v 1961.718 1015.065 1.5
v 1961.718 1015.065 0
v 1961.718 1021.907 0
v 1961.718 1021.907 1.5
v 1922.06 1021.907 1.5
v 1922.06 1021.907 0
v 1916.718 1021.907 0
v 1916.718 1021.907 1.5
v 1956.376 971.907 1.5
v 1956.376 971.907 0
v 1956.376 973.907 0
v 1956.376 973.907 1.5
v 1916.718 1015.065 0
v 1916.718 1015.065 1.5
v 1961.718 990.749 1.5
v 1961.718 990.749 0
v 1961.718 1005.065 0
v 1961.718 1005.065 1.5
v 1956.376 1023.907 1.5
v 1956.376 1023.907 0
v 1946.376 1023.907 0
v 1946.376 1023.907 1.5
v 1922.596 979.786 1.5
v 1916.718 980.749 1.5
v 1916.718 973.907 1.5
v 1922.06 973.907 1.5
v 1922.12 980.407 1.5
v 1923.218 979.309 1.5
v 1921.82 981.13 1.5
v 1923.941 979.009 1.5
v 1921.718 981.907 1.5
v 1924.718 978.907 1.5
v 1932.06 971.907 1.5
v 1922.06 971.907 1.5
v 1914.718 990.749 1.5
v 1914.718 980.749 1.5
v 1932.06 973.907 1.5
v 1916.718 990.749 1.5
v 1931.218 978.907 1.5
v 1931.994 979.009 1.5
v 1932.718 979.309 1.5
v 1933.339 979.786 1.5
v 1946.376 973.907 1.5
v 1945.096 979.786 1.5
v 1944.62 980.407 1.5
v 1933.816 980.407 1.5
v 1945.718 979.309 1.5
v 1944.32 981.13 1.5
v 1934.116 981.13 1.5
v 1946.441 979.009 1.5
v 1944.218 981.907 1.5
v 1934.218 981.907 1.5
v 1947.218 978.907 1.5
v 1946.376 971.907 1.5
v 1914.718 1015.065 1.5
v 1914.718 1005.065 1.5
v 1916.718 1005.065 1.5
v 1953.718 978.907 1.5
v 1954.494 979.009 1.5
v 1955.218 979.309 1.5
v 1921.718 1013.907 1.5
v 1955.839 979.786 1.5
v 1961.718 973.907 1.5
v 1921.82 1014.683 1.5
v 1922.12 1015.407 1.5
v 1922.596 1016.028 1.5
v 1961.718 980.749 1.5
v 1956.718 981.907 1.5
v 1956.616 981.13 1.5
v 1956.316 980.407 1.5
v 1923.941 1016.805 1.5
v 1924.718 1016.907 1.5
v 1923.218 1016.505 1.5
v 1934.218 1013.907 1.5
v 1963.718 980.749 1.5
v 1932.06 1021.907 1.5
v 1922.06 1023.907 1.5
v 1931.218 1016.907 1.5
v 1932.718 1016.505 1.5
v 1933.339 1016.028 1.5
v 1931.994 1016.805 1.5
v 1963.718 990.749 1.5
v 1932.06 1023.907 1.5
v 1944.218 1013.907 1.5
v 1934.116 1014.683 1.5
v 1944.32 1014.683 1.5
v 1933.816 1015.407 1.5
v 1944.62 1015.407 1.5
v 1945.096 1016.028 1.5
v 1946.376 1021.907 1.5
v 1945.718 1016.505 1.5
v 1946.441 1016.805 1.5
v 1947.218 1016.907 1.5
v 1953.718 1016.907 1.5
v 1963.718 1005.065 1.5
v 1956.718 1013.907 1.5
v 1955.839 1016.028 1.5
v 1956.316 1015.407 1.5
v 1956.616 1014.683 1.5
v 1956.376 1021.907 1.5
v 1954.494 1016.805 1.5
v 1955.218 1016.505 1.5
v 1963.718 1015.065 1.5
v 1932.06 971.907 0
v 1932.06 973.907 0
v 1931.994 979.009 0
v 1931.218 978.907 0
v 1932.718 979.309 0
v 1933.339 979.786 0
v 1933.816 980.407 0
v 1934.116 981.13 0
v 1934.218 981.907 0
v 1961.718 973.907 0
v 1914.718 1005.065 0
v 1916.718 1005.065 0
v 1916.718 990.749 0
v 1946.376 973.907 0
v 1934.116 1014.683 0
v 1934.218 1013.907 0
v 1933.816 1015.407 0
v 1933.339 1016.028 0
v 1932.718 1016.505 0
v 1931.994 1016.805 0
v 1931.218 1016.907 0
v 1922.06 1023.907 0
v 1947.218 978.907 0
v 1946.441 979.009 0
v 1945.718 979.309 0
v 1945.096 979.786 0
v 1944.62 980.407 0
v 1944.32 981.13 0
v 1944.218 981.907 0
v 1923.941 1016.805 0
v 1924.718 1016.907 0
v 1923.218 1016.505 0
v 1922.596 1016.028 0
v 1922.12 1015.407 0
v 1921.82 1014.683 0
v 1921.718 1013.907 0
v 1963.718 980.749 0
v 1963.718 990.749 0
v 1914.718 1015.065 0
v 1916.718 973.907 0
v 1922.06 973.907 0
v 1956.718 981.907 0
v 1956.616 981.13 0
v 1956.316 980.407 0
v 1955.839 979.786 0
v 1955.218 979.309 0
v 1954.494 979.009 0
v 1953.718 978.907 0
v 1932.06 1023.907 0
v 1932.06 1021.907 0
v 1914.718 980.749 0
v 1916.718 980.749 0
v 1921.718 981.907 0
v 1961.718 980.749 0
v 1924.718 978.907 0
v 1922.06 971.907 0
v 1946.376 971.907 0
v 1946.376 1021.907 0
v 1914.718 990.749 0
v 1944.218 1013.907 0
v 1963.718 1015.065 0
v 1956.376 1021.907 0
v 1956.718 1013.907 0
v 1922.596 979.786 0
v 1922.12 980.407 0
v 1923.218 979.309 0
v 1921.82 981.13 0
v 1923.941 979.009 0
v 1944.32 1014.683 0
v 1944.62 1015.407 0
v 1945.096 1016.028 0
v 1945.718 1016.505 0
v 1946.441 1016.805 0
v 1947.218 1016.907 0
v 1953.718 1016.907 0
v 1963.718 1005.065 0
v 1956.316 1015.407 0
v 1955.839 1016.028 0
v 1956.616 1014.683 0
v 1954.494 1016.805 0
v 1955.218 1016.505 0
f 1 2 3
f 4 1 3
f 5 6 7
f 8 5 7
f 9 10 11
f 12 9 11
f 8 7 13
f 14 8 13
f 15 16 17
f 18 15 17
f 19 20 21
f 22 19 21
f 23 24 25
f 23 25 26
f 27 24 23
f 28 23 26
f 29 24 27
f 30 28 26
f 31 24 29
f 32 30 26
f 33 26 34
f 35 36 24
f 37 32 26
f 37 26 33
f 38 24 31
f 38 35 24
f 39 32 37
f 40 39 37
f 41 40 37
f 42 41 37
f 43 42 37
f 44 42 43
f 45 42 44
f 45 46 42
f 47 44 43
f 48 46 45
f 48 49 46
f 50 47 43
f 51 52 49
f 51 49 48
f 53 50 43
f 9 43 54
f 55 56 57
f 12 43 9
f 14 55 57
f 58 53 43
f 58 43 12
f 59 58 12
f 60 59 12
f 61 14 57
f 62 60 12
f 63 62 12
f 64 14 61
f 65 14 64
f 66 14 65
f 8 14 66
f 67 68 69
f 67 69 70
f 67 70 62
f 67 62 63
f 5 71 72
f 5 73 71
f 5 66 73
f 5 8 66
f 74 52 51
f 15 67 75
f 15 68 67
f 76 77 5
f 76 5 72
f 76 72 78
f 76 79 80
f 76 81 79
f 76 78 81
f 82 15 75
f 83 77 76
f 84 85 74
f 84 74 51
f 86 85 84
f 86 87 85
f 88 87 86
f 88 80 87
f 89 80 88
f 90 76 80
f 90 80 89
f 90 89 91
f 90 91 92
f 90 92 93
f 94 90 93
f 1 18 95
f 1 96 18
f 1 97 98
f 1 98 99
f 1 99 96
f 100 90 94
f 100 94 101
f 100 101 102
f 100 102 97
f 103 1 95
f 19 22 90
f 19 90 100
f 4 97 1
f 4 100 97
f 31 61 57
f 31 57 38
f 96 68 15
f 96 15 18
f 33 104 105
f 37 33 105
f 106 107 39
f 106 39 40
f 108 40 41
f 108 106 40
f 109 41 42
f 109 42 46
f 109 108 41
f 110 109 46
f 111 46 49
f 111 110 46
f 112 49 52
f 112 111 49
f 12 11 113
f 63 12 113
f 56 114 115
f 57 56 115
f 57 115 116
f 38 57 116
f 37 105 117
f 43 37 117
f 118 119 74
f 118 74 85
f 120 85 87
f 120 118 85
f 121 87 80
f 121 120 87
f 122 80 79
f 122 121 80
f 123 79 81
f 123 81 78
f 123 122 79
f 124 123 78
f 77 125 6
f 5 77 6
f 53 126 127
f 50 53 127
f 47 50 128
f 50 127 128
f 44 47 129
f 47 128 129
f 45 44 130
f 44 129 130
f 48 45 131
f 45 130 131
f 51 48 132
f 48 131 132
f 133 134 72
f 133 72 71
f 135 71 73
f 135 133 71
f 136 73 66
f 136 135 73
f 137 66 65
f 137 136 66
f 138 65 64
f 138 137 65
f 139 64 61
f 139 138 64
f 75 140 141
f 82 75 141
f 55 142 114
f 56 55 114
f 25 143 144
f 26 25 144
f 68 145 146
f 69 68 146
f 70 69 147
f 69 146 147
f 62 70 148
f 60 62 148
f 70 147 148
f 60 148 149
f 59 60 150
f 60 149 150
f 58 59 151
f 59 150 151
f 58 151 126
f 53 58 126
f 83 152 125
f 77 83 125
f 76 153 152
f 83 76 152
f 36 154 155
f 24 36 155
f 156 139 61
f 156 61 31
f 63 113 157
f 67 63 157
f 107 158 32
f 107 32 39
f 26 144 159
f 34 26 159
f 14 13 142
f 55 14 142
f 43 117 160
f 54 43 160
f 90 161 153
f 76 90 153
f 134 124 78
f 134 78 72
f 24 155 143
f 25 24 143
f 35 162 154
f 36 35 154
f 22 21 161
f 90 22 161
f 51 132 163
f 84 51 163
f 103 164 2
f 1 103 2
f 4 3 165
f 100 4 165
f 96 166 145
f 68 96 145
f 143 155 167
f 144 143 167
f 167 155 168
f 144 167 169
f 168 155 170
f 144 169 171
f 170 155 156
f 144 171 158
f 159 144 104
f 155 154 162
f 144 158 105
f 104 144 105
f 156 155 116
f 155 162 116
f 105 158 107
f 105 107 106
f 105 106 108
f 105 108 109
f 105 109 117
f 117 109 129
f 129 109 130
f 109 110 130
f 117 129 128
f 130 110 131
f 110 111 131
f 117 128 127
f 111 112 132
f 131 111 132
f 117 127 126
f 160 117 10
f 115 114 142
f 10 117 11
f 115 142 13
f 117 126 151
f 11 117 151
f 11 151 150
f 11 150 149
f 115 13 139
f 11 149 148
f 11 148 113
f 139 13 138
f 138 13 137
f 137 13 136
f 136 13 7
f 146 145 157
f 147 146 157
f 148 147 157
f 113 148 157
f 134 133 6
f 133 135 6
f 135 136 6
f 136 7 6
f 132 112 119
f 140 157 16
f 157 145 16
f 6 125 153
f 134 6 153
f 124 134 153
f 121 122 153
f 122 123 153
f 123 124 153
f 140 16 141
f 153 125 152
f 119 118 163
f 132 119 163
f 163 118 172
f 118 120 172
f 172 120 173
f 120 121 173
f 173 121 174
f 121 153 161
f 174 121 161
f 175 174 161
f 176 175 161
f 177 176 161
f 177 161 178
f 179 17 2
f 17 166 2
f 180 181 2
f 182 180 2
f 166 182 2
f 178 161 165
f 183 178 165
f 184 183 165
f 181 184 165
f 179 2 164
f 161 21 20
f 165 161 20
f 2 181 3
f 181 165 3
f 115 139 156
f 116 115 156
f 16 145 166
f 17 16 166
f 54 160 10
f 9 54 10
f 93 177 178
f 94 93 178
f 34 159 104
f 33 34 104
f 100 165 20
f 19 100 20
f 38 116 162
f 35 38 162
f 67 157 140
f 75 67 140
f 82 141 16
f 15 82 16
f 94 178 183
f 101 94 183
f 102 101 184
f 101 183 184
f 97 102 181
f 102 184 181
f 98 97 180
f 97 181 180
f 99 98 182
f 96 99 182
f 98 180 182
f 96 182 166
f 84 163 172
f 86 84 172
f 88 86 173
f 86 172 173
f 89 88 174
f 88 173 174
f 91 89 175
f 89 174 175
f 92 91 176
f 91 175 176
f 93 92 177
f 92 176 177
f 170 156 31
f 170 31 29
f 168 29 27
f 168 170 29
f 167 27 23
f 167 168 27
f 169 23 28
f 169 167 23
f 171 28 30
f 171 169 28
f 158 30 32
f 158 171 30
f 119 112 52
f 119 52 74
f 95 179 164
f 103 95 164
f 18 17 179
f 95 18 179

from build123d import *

# Parameters (mm, degrees)
EXTRUDE_1_DEPTH = 1.5


with BuildPart() as part:
    # 草图1 → 凸台-拉伸1 (new body)
    with BuildSketch(Plane.XY):
        Polygon((1932.059632511, 1023.906869704), (1922.059632511, 1023.906869704), (1922.059632511, 1021.906869704), (1916.717816775, 1021.906869704), (1916.717816775, 1015.065053968), (1914.717816775, 1015.065053968), (1914.717816775, 1005.065053968), (1916.717816775, 1005.065053968), (1916.717816775, 990.748685439), (1914.717816775, 990.748685439), (1914.717816775, 980.748685439), (1916.717816775, 980.748685439), (1916.717816775, 973.906869704), (1922.059632511, 973.906869704), (1922.059632511, 971.906869704), (1932.059632511, 971.906869704), (1932.059632511, 973.906869704), (1946.376001039, 973.906869704), (1946.376001039, 971.906869704), (1956.376001039, 971.906869704), (1956.376001039, 973.906869704), (1961.717816775, 973.906869704), (1961.717816775, 980.748685439), (1963.717816775, 980.748685439), (1963.717816775, 990.748685439), (1961.717816775, 990.748685439), (1961.717816775, 1005.065053968), (1963.717816775, 1005.065053968), (1963.717816775, 1015.065053968), (1961.717816775, 1015.065053968), (1961.717816775, 1021.906869704), (1956.376001039, 1021.906869704), (1956.376001039, 1023.906869704), (1946.376001039, 1023.906869704), (1946.376001039, 1021.906869704), (1932.059632511, 1021.906869704), align=None)
        with BuildLine():
            Line((1921.717816775, 1013.906869704), (1921.717816775, 981.906869704))
            ThreePointArc((1921.717816775, 981.906869704), (1922.596496432, 979.78554936), (1924.717816775, 978.906869704))
            Line((1924.717816775, 978.906869704), (1931.217816775, 978.906869704))
            ThreePointArc((1931.217816775, 978.906869704), (1933.339137119, 979.78554936), (1934.217816775, 981.906869704))
            Line((1934.217816775, 981.906869704), (1934.217816775, 1013.906869704))
            ThreePointArc((1934.217816775, 1013.906869704), (1933.339137119, 1016.028190047), (1931.217816775, 1016.906869704))
            Line((1931.217816775, 1016.906869704), (1924.717816775, 1016.906869704))
            ThreePointArc((1924.717816775, 1016.906869704), (1922.596496432, 1016.028190047), (1921.717816775, 1013.906869704))
        make_face(mode=Mode.SUBTRACT)
        with BuildLine():
            Line((1956.717816775, 1013.906869704), (1956.717816775, 981.906869704))
            ThreePointArc((1956.717816775, 981.906869704), (1955.839137119, 979.78554936), (1953.717816775, 978.906869704))
            Line((1953.717816775, 978.906869704), (1947.217816775, 978.906869704))
            ThreePointArc((1947.217816775, 978.906869704), (1945.096496432, 979.78554936), (1944.217816775, 981.906869704))
            Line((1944.217816775, 981.906869704), (1944.217816775, 1013.906869704))
            ThreePointArc((1944.217816775, 1013.906869704), (1945.096496432, 1016.028190047), (1947.217816775, 1016.906869704))
            Line((1947.217816775, 1016.906869704), (1953.717816775, 1016.906869704))
            ThreePointArc((1953.717816775, 1016.906869704), (1955.839137119, 1016.028190047), (1956.717816775, 1013.906869704))
        make_face(mode=Mode.SUBTRACT)
    extrude(amount=EXTRUDE_1_DEPTH)


solid = part.part
